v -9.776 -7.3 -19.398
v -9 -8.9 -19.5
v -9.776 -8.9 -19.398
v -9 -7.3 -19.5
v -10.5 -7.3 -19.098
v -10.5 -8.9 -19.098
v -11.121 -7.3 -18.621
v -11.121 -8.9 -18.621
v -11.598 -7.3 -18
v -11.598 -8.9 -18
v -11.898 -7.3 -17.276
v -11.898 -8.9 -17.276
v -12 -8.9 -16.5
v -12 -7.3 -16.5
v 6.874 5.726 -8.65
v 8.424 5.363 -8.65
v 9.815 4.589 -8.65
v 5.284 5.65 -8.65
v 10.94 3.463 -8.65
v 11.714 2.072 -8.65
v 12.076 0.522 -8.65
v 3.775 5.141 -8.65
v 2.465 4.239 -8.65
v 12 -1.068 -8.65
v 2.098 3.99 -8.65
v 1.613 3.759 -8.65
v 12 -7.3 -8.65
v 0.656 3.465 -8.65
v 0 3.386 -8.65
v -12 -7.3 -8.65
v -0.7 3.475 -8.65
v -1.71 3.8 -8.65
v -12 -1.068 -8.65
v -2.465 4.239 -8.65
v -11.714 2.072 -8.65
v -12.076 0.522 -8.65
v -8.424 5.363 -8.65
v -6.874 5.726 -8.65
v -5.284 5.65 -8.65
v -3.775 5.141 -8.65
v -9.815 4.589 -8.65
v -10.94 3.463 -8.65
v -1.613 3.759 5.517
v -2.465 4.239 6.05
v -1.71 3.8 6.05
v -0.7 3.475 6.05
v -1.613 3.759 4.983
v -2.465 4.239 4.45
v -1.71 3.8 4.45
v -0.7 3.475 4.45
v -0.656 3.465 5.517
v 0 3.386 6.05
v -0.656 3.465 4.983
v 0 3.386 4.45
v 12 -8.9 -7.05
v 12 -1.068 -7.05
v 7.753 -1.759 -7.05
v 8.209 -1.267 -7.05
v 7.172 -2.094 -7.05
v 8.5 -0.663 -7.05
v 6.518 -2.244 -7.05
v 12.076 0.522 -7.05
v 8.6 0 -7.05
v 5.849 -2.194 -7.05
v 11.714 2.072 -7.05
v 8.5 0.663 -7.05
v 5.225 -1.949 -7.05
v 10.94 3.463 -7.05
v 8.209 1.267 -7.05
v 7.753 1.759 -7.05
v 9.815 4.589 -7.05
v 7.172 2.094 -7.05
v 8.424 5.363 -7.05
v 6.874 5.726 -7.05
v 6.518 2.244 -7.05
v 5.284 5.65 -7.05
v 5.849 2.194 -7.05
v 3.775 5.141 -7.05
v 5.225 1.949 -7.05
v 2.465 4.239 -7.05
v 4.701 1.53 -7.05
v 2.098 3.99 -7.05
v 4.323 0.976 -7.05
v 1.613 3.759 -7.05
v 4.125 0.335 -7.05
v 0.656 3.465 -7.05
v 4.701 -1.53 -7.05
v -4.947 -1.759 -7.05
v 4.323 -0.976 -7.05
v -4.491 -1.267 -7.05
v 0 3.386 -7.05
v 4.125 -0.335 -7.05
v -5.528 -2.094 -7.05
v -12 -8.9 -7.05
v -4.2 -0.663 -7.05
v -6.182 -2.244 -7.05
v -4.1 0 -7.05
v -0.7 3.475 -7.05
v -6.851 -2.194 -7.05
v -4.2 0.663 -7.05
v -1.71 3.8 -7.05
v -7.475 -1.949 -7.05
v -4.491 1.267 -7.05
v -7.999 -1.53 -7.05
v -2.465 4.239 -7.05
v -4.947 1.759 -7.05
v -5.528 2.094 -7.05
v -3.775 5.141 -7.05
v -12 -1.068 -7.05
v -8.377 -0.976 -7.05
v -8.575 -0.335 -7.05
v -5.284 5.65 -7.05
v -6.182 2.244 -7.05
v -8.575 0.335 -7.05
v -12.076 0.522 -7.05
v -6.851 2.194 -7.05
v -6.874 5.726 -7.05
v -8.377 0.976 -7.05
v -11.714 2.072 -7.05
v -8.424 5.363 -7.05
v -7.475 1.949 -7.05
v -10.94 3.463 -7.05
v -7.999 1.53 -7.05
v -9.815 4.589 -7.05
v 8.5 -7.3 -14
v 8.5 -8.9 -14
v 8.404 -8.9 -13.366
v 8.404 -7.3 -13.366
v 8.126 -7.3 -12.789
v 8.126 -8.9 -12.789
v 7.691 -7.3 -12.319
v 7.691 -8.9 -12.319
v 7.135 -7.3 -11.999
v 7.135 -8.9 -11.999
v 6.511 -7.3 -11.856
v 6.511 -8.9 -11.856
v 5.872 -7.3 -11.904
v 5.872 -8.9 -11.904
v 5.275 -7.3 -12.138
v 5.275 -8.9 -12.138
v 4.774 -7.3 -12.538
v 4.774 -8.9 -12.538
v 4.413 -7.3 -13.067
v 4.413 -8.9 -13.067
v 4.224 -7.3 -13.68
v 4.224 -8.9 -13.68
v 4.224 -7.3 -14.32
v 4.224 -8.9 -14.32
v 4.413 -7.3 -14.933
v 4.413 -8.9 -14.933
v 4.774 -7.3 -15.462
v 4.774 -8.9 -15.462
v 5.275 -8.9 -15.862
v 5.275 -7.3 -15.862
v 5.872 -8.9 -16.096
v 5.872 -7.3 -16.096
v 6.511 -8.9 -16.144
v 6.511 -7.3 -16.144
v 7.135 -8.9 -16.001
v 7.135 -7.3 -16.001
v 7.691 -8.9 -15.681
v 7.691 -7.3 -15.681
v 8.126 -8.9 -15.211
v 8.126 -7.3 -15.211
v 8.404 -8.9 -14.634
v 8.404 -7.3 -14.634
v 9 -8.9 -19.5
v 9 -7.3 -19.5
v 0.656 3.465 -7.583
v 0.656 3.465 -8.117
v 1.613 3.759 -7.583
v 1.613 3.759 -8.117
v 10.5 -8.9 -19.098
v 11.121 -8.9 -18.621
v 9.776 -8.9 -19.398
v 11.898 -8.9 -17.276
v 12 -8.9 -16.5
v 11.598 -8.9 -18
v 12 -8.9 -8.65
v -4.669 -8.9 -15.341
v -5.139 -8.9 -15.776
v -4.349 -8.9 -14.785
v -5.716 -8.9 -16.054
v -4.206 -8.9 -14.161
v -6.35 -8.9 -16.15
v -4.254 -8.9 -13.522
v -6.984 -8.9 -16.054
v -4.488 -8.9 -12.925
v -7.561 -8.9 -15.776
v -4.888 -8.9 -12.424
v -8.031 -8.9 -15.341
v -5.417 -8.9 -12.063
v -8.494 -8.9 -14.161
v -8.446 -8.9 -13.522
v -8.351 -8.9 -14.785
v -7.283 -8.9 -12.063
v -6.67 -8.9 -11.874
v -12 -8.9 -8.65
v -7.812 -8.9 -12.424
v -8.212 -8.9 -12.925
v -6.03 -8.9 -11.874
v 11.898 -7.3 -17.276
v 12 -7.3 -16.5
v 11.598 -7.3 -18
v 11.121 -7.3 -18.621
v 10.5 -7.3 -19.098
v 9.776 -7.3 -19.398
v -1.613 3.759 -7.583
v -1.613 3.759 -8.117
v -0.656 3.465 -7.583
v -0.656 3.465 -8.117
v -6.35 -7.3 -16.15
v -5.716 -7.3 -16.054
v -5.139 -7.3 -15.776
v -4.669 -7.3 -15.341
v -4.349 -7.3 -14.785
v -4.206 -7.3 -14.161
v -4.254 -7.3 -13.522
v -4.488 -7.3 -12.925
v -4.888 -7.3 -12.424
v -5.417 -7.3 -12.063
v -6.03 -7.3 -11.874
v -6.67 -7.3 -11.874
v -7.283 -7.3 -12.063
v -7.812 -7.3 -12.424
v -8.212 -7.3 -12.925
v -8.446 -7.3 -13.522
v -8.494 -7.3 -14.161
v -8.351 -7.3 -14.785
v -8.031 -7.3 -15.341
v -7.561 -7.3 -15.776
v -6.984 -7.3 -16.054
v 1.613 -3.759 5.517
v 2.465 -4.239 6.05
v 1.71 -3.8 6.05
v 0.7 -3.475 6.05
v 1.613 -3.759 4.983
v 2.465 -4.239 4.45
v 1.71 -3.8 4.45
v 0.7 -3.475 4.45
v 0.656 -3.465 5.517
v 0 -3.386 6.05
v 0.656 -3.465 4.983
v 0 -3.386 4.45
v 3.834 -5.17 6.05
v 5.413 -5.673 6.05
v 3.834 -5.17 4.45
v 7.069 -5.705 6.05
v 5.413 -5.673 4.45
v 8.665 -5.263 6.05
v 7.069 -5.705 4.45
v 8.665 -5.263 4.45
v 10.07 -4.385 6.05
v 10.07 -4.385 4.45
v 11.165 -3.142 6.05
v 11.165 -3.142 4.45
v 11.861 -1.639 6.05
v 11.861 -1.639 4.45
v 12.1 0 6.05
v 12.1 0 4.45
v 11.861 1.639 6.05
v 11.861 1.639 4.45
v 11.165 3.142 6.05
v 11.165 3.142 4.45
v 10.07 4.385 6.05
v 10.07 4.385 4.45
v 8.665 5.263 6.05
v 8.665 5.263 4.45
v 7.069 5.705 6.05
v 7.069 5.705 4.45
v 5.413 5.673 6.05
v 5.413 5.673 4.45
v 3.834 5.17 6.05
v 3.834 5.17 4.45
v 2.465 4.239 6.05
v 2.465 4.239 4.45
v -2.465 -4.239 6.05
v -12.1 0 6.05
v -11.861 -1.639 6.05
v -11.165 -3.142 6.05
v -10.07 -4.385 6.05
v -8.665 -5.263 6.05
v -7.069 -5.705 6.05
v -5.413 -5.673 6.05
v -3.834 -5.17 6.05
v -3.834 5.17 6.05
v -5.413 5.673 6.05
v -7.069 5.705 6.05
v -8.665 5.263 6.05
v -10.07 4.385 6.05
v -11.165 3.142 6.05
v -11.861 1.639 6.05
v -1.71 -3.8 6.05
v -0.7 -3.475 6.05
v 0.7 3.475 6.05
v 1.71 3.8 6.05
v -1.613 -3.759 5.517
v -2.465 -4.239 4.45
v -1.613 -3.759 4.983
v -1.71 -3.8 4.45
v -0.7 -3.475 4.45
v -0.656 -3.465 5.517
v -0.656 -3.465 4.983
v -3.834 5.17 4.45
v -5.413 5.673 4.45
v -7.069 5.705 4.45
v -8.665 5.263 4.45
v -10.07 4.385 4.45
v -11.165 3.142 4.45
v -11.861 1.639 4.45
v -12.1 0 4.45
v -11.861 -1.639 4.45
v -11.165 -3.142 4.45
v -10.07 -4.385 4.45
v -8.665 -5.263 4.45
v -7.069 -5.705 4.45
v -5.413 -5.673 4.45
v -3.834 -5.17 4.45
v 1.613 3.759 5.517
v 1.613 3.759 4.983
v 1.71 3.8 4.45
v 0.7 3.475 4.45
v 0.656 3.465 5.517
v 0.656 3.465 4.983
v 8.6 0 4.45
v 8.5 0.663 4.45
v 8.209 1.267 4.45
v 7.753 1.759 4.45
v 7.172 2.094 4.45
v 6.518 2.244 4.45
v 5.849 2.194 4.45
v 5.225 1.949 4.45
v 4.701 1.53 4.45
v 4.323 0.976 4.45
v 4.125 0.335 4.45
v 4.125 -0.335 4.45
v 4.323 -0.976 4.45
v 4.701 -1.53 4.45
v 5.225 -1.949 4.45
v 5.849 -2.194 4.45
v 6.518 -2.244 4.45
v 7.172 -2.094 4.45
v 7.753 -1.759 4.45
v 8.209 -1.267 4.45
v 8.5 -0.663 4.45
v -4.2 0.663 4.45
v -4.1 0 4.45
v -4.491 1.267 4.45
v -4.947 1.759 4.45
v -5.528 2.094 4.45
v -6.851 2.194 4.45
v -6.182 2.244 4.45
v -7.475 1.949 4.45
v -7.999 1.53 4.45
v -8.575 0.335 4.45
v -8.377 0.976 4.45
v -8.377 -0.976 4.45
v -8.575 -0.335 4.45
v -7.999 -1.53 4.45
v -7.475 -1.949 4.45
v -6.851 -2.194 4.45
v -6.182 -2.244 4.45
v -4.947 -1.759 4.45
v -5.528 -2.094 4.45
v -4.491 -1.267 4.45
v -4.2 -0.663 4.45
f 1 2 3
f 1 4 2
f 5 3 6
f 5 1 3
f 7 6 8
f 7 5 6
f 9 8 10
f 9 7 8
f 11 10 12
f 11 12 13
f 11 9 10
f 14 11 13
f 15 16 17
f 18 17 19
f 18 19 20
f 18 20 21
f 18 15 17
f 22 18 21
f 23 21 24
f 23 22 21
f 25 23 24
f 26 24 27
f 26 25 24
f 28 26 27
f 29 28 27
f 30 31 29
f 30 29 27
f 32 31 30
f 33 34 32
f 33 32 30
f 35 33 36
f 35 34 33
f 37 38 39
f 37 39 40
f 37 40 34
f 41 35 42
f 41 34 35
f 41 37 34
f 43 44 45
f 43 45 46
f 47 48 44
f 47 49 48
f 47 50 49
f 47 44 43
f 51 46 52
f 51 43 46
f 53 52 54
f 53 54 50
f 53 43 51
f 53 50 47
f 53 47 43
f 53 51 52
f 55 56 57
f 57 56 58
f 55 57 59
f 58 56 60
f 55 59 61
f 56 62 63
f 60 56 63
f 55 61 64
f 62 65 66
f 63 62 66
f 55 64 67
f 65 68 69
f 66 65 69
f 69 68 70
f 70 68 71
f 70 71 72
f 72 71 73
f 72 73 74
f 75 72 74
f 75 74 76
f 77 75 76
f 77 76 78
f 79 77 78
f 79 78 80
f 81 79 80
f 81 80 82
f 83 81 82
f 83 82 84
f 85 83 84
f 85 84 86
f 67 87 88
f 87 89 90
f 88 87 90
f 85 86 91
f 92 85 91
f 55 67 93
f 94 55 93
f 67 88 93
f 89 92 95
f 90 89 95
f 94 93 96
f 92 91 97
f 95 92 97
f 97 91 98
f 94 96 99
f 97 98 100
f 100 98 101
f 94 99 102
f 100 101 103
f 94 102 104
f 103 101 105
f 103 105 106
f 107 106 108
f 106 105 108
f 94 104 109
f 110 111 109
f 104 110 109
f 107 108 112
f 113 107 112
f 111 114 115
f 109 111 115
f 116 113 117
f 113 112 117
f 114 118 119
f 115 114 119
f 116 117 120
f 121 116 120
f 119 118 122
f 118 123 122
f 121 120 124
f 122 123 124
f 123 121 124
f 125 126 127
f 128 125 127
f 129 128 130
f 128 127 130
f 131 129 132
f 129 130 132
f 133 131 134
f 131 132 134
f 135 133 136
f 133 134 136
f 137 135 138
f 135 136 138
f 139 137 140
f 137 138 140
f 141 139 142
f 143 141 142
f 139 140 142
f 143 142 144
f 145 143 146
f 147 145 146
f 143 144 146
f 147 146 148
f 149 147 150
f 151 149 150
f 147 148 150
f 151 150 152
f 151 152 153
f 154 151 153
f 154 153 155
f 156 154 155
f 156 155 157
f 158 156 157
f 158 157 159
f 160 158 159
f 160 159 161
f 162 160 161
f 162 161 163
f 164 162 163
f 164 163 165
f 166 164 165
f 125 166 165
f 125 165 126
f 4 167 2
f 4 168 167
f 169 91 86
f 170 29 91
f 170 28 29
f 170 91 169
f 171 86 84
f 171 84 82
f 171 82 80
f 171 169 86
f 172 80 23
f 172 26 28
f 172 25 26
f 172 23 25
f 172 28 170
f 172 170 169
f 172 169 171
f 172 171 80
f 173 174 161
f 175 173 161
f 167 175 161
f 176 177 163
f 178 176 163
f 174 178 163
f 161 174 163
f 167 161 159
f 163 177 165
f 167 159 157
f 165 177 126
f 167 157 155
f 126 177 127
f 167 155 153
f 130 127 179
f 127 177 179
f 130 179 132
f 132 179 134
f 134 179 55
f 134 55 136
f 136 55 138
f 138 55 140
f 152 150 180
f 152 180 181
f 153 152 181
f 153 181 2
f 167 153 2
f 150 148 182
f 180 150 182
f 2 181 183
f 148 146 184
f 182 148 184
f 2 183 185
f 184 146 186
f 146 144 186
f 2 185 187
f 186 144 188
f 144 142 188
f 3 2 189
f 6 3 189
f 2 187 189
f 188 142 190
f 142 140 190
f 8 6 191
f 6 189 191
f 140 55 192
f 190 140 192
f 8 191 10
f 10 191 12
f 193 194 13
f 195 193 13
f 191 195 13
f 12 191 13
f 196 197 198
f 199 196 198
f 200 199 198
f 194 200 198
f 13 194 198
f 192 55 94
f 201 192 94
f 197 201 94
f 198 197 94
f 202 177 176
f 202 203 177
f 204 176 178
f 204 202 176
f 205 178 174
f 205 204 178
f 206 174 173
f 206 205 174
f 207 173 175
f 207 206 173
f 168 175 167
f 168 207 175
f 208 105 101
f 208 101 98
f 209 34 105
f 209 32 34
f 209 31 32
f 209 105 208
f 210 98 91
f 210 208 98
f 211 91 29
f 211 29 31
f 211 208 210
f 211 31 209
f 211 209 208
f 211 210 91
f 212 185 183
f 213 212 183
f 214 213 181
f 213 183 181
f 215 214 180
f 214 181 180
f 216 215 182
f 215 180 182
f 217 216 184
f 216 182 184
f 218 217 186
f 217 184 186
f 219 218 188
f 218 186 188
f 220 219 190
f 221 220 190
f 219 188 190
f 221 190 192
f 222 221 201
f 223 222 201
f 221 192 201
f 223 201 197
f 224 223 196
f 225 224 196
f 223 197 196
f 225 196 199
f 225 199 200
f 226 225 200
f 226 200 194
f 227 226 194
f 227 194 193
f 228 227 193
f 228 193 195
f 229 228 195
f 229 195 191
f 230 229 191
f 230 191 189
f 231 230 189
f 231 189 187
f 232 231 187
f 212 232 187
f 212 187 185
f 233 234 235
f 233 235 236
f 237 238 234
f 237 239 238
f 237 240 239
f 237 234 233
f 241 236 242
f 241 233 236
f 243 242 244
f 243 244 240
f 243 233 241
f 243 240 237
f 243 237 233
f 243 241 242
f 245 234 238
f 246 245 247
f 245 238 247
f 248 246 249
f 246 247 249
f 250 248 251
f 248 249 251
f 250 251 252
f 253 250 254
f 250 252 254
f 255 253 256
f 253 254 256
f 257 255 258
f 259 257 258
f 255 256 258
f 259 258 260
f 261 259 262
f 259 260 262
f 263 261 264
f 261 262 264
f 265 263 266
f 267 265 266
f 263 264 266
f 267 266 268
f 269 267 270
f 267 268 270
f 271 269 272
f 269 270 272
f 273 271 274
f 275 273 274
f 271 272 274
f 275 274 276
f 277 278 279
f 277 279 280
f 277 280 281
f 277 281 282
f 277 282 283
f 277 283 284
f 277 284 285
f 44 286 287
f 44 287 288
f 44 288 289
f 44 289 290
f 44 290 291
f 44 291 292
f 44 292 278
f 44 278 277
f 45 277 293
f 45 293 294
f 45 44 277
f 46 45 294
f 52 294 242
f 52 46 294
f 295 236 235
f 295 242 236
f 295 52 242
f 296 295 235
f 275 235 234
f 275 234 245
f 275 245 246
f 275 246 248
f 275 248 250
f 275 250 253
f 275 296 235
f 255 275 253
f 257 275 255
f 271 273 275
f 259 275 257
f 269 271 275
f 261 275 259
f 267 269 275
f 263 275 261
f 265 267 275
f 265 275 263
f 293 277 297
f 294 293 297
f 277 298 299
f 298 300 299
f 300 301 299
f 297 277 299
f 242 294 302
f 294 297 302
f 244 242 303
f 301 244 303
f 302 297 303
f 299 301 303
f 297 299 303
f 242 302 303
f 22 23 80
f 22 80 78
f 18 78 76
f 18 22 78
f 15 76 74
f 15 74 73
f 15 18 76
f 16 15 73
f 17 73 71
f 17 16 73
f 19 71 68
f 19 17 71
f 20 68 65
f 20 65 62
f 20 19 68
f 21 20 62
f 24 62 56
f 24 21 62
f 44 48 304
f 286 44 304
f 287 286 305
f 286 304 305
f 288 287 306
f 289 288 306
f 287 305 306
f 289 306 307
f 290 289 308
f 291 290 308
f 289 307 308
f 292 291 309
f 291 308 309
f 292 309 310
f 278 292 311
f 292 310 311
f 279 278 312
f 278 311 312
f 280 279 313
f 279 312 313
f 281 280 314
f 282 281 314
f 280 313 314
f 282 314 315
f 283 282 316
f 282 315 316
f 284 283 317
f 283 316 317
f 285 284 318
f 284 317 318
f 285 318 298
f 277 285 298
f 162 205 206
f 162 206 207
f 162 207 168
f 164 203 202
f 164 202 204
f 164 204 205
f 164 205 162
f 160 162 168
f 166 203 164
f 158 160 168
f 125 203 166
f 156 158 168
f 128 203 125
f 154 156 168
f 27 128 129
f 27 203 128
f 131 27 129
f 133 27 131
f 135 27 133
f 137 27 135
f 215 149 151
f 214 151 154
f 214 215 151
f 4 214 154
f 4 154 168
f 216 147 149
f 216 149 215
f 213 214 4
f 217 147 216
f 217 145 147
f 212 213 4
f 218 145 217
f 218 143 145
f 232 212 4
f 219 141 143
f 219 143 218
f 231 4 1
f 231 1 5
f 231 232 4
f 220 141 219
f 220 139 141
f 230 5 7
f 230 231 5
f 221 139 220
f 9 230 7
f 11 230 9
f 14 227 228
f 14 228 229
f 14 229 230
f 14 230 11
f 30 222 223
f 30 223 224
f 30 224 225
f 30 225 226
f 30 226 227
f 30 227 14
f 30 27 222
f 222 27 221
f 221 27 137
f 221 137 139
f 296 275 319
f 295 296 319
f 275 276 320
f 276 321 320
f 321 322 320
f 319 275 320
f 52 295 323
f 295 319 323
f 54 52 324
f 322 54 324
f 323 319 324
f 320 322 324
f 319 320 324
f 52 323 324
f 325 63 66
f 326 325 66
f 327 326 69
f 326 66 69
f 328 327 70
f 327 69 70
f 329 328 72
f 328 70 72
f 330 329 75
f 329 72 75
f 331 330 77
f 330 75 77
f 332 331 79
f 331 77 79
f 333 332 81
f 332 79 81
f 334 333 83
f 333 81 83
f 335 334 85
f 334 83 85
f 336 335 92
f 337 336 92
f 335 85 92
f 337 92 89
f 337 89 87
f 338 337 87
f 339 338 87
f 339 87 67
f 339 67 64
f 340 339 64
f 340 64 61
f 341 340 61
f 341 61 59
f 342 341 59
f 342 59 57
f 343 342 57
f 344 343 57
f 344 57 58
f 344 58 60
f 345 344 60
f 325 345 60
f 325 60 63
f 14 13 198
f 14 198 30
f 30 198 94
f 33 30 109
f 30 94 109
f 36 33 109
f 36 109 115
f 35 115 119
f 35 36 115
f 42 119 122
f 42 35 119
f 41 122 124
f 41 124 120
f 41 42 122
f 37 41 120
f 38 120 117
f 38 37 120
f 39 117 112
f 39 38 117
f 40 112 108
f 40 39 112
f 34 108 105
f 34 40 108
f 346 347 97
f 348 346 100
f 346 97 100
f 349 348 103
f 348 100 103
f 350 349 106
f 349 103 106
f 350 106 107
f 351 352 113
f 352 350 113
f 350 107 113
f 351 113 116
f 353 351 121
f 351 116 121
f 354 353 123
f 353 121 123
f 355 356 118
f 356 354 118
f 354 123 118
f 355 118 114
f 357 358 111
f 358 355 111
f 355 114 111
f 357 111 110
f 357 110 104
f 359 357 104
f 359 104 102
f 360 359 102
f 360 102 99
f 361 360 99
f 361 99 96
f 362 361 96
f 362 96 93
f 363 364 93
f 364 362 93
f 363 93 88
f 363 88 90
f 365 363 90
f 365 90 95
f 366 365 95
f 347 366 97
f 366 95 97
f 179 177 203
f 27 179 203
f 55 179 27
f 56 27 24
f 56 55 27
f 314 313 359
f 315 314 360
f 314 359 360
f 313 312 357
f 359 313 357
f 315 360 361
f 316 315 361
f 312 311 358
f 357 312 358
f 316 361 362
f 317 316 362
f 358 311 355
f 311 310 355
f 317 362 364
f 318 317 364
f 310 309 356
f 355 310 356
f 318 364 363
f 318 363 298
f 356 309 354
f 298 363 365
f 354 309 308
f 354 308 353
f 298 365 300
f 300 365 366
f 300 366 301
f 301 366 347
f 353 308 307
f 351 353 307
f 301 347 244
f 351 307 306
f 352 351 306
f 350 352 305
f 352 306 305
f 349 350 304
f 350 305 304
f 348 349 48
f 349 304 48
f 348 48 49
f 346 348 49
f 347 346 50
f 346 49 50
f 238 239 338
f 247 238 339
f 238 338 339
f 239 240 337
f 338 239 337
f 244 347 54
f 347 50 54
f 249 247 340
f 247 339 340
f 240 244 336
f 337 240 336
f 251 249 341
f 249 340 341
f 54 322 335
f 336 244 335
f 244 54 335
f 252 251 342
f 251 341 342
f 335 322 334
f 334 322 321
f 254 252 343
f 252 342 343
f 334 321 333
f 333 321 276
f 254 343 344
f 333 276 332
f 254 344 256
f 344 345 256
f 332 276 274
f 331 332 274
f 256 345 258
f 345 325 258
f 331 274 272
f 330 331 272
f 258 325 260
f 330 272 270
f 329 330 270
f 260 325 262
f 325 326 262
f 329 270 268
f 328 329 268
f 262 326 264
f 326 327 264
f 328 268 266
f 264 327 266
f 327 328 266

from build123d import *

# Parameters (mm, degrees)
SKETCH_1_R          = 4.25
SKETCH_1_R_2        = 2.25
EXTRUDE_1_DEPTH     = 4.45
EXTRUDE_1_2_DEPTH   = 4.45
SKETCH_2_R          = 5.75
SKETCH_2_R_2        = 4.25
SKETCH_2_R_3        = 2.25
EXTRUDE_3_DEPTH     = 1.6
SKETCH_3_R          = 4.25
CUT_EXTRUDE_1_DEPTH = 4.45
EXTRUDE_START       = -13.1
SKETCH_4_R          = 2.25
EXTRUDE_4_DEPTH     = 13.1
EXTRUDE_START_2     = 1.6
SKETCH_5_W          = 24
SKETCH_5_H          = 7.832292175
EXTRUDE_6_DEPTH     = 1.6
SKETCH_6_W          = 24
SKETCH_6_H          = 1.6
EXTRUDE_7_DEPTH     = 10.85
SKETCH_9_R          = 2.15
CUT_EXTRUDE_2_DEPTH = 28.22650373
FILLET_1_R          = 3


with BuildPart() as part:
    # 草图1 → 凸台-拉伸1 (new body)
    with BuildSketch(Plane.XY):
        with Locations((-6.35, 0)):
            Circle(SKETCH_1_R)
        with Locations((-6.35, 0)):
            Circle(SKETCH_1_R_2, mode=Mode.SUBTRACT)
    extrude(amount=EXTRUDE_1_DEPTH)



with BuildPart() as body_2:
    # 草图1 → Extrude 1 2 (new body)
    with BuildSketch(Plane.XY):
        with Locations(Location((6.35, 0, 0), (0, 0, 180))):
            Circle(SKETCH_1_R)
        with Locations(Location((6.35, 0, 0), (0, 0, 180))):
            Circle(SKETCH_1_R_2, mode=Mode.SUBTRACT)
    extrude(amount=EXTRUDE_1_2_DEPTH)


with BuildPart() as part_1:
    add(part.part)

    add(body_2.part)  # 凸台-拉伸3 merges body 2
    # 草图2 → 凸台-拉伸3 (add)
    # profile 1 of 4: a face of its own
    with BuildSketch(Plane.XY.offset(4.45)):
        with Locations((-6.35, 0)):
            Circle(SKETCH_2_R)
        with Locations((-6.35, 0)):
            Circle(SKETCH_2_R_2, mode=Mode.SUBTRACT)
    # profile 2 of 4: a face of its own
    with BuildSketch(Plane.XY.offset(4.45)):
        with Locations((-6.35, 0)):
            Circle(SKETCH_2_R_2)
        with Locations((-6.35, 0)):
            Circle(SKETCH_2_R_3, mode=Mode.SUBTRACT)
    # profile 3 of 4: a face of its own
    with BuildSketch(Plane.XY.offset(4.45)):
        with BuildLine():
            ThreePointArc((-2.464522189, 4.238580208), (-1.086731177, 2.315275641), (-0.6, 0))
            ThreePointArc((-0.6, 0), (-1.086731177, -2.315275641), (-2.464522189, -4.238580208))
            add(Edge.make_bspline(
                [(-2.464522189, -4.238580208), (-1.801147303, -3.67793909), (-0.370790644, -3.34588107), (0, -3.386350938)],
                knots=[0, 0, 0, 0, 1, 1, 1, 1], degree=3))
            add(Edge.make_bspline(
                [(2.464522189, -4.238580208), (1.801147303, -3.67793909), (0.370790644, -3.34588107), (0, -3.386350938)],
                knots=[0, 0, 0, 0, 1, 1, 1, 1], degree=3))
            ThreePointArc((2.464522189, -4.238580208), (0.6, 0), (2.464522189, 4.238580208))
            add(Edge.make_bspline(
                [(2.464522189, 4.238580208), (1.801147303, 3.67793909), (0.370790644, 3.34588107), (0, 3.386350938)],
                knots=[0, 0, 0, 0, 1, 1, 1, 1], degree=3))
            add(Edge.make_bspline(
                [(-2.464522189, 4.238580208), (-1.801147303, 3.67793909), (-0.370790644, 3.34588107), (0, 3.386350938)],
                knots=[0, 0, 0, 0, 1, 1, 1, 1], degree=3))
        make_face()
    # profile 4 of 4: a face of its own
    with BuildSketch(Plane.XY.offset(4.45)):
        with Locations((6.35, 0)):
            Circle(SKETCH_2_R)
        with Locations(Location((6.35, 0, 0), (0, 0, 180))):
            Circle(SKETCH_2_R_3, mode=Mode.SUBTRACT)
    extrude(amount=EXTRUDE_3_DEPTH)

    # 草图3 → 切除-拉伸1 (cut)
    with BuildSketch(Plane(origin=(0, 0, 0), x_dir=(-1, 0, 0), z_dir=(0, 0, -1))):
        with Locations((6.35, 0)):
            Circle(SKETCH_3_R)
        with Locations((-6.35, 0)):
            Circle(SKETCH_3_R)
    extrude(amount=-CUT_EXTRUDE_1_DEPTH, mode=Mode.SUBTRACT)

    # 草图4 → 凸台-拉伸4 (add)
    with BuildSketch(Plane.XY.offset(6.05).offset(EXTRUDE_START)):
        with Locations((-6.35, 0)):
            Circle(SKETCH_4_R)
        with Locations((6.35, 0)):
            Circle(SKETCH_4_R)
    extrude(amount=EXTRUDE_4_DEPTH)

    # 草图5 → 凸台-拉伸6 (add)
    with BuildSketch(Plane(origin=(0, 0, -7.05), x_dir=(-1, 0, 0), z_dir=(0, 0, -1)).offset(EXTRUDE_START_2)):
        with Locations((0, -4.983853912)):
            Rectangle(SKETCH_5_W, SKETCH_5_H)
        with BuildLine():
            ThreePointArc((2.464522189, -4.238580208), (12.1, 0), (2.464522189, 4.238580208))
            add(Edge.make_bspline(
                [(2.464522189, 4.238580208), (1.801147303, 3.67793909), (0.370790644, 3.34588107), (0, 3.386350938)],
                knots=[0, 0, 0, 0, 1, 1, 1, 1], degree=3))
            add(Edge.make_bspline(
                [(0, 3.386350938), (-0.370790644, 3.34588107), (-1.801147303, 3.67793909), (-2.464522189, 4.238580208)],
                knots=[0, 0, 0, 0, 1, 1, 1, 1], degree=3))
            ThreePointArc((-2.464522189, 4.238580208), (-12.1, 0), (-2.464522189, -4.238580208))
            add(Edge.make_bspline(
                [(-2.464522189, -4.238580208), (-1.801147303, -3.67793909), (-0.370790644, -3.34588107), (0, -3.386350938)],
                knots=[0, 0, 0, 0, 1, 1, 1, 1], degree=3))
            add(Edge.make_bspline(
                [(0, -3.386350938), (0.370790644, -3.34588107), (1.801147303, -3.67793909), (2.464522189, -4.238580208)],
                knots=[0, 0, 0, 0, 1, 1, 1, 1], degree=3))
        make_face()
    extrude(amount=-EXTRUDE_6_DEPTH)

    # 草图6 → 凸台-拉伸7 (add)
    with BuildSketch(Plane(origin=(0, 0, -8.65), x_dir=(-1, 0, 0), z_dir=(0, 0, -1))):
        with Locations((0, -8.1)):
            Rectangle(SKETCH_6_W, SKETCH_6_H)
    extrude(amount=EXTRUDE_7_DEPTH)

    # 草图9 → 切除-拉伸2 (cut, through all)
    with BuildSketch(Plane.XZ.offset(8.9)):
        with Locations(Location((-6.35, -14, 0), (0, 0, 270))):
            Circle(SKETCH_9_R)
        with Locations((6.35, -14)):
            Circle(SKETCH_9_R)
    extrude(amount=-CUT_EXTRUDE_2_DEPTH, mode=Mode.SUBTRACT)

    # 圆角1
    fillet_1_edges = [part_1.edges().sort_by_distance(p)[0] for p in [
        (-12, -8.1, -19.5),
        (12, -8.1, -19.5),
    ]]
    fillet(fillet_1_edges, radius=FILLET_1_R)


solid = part_1.part
